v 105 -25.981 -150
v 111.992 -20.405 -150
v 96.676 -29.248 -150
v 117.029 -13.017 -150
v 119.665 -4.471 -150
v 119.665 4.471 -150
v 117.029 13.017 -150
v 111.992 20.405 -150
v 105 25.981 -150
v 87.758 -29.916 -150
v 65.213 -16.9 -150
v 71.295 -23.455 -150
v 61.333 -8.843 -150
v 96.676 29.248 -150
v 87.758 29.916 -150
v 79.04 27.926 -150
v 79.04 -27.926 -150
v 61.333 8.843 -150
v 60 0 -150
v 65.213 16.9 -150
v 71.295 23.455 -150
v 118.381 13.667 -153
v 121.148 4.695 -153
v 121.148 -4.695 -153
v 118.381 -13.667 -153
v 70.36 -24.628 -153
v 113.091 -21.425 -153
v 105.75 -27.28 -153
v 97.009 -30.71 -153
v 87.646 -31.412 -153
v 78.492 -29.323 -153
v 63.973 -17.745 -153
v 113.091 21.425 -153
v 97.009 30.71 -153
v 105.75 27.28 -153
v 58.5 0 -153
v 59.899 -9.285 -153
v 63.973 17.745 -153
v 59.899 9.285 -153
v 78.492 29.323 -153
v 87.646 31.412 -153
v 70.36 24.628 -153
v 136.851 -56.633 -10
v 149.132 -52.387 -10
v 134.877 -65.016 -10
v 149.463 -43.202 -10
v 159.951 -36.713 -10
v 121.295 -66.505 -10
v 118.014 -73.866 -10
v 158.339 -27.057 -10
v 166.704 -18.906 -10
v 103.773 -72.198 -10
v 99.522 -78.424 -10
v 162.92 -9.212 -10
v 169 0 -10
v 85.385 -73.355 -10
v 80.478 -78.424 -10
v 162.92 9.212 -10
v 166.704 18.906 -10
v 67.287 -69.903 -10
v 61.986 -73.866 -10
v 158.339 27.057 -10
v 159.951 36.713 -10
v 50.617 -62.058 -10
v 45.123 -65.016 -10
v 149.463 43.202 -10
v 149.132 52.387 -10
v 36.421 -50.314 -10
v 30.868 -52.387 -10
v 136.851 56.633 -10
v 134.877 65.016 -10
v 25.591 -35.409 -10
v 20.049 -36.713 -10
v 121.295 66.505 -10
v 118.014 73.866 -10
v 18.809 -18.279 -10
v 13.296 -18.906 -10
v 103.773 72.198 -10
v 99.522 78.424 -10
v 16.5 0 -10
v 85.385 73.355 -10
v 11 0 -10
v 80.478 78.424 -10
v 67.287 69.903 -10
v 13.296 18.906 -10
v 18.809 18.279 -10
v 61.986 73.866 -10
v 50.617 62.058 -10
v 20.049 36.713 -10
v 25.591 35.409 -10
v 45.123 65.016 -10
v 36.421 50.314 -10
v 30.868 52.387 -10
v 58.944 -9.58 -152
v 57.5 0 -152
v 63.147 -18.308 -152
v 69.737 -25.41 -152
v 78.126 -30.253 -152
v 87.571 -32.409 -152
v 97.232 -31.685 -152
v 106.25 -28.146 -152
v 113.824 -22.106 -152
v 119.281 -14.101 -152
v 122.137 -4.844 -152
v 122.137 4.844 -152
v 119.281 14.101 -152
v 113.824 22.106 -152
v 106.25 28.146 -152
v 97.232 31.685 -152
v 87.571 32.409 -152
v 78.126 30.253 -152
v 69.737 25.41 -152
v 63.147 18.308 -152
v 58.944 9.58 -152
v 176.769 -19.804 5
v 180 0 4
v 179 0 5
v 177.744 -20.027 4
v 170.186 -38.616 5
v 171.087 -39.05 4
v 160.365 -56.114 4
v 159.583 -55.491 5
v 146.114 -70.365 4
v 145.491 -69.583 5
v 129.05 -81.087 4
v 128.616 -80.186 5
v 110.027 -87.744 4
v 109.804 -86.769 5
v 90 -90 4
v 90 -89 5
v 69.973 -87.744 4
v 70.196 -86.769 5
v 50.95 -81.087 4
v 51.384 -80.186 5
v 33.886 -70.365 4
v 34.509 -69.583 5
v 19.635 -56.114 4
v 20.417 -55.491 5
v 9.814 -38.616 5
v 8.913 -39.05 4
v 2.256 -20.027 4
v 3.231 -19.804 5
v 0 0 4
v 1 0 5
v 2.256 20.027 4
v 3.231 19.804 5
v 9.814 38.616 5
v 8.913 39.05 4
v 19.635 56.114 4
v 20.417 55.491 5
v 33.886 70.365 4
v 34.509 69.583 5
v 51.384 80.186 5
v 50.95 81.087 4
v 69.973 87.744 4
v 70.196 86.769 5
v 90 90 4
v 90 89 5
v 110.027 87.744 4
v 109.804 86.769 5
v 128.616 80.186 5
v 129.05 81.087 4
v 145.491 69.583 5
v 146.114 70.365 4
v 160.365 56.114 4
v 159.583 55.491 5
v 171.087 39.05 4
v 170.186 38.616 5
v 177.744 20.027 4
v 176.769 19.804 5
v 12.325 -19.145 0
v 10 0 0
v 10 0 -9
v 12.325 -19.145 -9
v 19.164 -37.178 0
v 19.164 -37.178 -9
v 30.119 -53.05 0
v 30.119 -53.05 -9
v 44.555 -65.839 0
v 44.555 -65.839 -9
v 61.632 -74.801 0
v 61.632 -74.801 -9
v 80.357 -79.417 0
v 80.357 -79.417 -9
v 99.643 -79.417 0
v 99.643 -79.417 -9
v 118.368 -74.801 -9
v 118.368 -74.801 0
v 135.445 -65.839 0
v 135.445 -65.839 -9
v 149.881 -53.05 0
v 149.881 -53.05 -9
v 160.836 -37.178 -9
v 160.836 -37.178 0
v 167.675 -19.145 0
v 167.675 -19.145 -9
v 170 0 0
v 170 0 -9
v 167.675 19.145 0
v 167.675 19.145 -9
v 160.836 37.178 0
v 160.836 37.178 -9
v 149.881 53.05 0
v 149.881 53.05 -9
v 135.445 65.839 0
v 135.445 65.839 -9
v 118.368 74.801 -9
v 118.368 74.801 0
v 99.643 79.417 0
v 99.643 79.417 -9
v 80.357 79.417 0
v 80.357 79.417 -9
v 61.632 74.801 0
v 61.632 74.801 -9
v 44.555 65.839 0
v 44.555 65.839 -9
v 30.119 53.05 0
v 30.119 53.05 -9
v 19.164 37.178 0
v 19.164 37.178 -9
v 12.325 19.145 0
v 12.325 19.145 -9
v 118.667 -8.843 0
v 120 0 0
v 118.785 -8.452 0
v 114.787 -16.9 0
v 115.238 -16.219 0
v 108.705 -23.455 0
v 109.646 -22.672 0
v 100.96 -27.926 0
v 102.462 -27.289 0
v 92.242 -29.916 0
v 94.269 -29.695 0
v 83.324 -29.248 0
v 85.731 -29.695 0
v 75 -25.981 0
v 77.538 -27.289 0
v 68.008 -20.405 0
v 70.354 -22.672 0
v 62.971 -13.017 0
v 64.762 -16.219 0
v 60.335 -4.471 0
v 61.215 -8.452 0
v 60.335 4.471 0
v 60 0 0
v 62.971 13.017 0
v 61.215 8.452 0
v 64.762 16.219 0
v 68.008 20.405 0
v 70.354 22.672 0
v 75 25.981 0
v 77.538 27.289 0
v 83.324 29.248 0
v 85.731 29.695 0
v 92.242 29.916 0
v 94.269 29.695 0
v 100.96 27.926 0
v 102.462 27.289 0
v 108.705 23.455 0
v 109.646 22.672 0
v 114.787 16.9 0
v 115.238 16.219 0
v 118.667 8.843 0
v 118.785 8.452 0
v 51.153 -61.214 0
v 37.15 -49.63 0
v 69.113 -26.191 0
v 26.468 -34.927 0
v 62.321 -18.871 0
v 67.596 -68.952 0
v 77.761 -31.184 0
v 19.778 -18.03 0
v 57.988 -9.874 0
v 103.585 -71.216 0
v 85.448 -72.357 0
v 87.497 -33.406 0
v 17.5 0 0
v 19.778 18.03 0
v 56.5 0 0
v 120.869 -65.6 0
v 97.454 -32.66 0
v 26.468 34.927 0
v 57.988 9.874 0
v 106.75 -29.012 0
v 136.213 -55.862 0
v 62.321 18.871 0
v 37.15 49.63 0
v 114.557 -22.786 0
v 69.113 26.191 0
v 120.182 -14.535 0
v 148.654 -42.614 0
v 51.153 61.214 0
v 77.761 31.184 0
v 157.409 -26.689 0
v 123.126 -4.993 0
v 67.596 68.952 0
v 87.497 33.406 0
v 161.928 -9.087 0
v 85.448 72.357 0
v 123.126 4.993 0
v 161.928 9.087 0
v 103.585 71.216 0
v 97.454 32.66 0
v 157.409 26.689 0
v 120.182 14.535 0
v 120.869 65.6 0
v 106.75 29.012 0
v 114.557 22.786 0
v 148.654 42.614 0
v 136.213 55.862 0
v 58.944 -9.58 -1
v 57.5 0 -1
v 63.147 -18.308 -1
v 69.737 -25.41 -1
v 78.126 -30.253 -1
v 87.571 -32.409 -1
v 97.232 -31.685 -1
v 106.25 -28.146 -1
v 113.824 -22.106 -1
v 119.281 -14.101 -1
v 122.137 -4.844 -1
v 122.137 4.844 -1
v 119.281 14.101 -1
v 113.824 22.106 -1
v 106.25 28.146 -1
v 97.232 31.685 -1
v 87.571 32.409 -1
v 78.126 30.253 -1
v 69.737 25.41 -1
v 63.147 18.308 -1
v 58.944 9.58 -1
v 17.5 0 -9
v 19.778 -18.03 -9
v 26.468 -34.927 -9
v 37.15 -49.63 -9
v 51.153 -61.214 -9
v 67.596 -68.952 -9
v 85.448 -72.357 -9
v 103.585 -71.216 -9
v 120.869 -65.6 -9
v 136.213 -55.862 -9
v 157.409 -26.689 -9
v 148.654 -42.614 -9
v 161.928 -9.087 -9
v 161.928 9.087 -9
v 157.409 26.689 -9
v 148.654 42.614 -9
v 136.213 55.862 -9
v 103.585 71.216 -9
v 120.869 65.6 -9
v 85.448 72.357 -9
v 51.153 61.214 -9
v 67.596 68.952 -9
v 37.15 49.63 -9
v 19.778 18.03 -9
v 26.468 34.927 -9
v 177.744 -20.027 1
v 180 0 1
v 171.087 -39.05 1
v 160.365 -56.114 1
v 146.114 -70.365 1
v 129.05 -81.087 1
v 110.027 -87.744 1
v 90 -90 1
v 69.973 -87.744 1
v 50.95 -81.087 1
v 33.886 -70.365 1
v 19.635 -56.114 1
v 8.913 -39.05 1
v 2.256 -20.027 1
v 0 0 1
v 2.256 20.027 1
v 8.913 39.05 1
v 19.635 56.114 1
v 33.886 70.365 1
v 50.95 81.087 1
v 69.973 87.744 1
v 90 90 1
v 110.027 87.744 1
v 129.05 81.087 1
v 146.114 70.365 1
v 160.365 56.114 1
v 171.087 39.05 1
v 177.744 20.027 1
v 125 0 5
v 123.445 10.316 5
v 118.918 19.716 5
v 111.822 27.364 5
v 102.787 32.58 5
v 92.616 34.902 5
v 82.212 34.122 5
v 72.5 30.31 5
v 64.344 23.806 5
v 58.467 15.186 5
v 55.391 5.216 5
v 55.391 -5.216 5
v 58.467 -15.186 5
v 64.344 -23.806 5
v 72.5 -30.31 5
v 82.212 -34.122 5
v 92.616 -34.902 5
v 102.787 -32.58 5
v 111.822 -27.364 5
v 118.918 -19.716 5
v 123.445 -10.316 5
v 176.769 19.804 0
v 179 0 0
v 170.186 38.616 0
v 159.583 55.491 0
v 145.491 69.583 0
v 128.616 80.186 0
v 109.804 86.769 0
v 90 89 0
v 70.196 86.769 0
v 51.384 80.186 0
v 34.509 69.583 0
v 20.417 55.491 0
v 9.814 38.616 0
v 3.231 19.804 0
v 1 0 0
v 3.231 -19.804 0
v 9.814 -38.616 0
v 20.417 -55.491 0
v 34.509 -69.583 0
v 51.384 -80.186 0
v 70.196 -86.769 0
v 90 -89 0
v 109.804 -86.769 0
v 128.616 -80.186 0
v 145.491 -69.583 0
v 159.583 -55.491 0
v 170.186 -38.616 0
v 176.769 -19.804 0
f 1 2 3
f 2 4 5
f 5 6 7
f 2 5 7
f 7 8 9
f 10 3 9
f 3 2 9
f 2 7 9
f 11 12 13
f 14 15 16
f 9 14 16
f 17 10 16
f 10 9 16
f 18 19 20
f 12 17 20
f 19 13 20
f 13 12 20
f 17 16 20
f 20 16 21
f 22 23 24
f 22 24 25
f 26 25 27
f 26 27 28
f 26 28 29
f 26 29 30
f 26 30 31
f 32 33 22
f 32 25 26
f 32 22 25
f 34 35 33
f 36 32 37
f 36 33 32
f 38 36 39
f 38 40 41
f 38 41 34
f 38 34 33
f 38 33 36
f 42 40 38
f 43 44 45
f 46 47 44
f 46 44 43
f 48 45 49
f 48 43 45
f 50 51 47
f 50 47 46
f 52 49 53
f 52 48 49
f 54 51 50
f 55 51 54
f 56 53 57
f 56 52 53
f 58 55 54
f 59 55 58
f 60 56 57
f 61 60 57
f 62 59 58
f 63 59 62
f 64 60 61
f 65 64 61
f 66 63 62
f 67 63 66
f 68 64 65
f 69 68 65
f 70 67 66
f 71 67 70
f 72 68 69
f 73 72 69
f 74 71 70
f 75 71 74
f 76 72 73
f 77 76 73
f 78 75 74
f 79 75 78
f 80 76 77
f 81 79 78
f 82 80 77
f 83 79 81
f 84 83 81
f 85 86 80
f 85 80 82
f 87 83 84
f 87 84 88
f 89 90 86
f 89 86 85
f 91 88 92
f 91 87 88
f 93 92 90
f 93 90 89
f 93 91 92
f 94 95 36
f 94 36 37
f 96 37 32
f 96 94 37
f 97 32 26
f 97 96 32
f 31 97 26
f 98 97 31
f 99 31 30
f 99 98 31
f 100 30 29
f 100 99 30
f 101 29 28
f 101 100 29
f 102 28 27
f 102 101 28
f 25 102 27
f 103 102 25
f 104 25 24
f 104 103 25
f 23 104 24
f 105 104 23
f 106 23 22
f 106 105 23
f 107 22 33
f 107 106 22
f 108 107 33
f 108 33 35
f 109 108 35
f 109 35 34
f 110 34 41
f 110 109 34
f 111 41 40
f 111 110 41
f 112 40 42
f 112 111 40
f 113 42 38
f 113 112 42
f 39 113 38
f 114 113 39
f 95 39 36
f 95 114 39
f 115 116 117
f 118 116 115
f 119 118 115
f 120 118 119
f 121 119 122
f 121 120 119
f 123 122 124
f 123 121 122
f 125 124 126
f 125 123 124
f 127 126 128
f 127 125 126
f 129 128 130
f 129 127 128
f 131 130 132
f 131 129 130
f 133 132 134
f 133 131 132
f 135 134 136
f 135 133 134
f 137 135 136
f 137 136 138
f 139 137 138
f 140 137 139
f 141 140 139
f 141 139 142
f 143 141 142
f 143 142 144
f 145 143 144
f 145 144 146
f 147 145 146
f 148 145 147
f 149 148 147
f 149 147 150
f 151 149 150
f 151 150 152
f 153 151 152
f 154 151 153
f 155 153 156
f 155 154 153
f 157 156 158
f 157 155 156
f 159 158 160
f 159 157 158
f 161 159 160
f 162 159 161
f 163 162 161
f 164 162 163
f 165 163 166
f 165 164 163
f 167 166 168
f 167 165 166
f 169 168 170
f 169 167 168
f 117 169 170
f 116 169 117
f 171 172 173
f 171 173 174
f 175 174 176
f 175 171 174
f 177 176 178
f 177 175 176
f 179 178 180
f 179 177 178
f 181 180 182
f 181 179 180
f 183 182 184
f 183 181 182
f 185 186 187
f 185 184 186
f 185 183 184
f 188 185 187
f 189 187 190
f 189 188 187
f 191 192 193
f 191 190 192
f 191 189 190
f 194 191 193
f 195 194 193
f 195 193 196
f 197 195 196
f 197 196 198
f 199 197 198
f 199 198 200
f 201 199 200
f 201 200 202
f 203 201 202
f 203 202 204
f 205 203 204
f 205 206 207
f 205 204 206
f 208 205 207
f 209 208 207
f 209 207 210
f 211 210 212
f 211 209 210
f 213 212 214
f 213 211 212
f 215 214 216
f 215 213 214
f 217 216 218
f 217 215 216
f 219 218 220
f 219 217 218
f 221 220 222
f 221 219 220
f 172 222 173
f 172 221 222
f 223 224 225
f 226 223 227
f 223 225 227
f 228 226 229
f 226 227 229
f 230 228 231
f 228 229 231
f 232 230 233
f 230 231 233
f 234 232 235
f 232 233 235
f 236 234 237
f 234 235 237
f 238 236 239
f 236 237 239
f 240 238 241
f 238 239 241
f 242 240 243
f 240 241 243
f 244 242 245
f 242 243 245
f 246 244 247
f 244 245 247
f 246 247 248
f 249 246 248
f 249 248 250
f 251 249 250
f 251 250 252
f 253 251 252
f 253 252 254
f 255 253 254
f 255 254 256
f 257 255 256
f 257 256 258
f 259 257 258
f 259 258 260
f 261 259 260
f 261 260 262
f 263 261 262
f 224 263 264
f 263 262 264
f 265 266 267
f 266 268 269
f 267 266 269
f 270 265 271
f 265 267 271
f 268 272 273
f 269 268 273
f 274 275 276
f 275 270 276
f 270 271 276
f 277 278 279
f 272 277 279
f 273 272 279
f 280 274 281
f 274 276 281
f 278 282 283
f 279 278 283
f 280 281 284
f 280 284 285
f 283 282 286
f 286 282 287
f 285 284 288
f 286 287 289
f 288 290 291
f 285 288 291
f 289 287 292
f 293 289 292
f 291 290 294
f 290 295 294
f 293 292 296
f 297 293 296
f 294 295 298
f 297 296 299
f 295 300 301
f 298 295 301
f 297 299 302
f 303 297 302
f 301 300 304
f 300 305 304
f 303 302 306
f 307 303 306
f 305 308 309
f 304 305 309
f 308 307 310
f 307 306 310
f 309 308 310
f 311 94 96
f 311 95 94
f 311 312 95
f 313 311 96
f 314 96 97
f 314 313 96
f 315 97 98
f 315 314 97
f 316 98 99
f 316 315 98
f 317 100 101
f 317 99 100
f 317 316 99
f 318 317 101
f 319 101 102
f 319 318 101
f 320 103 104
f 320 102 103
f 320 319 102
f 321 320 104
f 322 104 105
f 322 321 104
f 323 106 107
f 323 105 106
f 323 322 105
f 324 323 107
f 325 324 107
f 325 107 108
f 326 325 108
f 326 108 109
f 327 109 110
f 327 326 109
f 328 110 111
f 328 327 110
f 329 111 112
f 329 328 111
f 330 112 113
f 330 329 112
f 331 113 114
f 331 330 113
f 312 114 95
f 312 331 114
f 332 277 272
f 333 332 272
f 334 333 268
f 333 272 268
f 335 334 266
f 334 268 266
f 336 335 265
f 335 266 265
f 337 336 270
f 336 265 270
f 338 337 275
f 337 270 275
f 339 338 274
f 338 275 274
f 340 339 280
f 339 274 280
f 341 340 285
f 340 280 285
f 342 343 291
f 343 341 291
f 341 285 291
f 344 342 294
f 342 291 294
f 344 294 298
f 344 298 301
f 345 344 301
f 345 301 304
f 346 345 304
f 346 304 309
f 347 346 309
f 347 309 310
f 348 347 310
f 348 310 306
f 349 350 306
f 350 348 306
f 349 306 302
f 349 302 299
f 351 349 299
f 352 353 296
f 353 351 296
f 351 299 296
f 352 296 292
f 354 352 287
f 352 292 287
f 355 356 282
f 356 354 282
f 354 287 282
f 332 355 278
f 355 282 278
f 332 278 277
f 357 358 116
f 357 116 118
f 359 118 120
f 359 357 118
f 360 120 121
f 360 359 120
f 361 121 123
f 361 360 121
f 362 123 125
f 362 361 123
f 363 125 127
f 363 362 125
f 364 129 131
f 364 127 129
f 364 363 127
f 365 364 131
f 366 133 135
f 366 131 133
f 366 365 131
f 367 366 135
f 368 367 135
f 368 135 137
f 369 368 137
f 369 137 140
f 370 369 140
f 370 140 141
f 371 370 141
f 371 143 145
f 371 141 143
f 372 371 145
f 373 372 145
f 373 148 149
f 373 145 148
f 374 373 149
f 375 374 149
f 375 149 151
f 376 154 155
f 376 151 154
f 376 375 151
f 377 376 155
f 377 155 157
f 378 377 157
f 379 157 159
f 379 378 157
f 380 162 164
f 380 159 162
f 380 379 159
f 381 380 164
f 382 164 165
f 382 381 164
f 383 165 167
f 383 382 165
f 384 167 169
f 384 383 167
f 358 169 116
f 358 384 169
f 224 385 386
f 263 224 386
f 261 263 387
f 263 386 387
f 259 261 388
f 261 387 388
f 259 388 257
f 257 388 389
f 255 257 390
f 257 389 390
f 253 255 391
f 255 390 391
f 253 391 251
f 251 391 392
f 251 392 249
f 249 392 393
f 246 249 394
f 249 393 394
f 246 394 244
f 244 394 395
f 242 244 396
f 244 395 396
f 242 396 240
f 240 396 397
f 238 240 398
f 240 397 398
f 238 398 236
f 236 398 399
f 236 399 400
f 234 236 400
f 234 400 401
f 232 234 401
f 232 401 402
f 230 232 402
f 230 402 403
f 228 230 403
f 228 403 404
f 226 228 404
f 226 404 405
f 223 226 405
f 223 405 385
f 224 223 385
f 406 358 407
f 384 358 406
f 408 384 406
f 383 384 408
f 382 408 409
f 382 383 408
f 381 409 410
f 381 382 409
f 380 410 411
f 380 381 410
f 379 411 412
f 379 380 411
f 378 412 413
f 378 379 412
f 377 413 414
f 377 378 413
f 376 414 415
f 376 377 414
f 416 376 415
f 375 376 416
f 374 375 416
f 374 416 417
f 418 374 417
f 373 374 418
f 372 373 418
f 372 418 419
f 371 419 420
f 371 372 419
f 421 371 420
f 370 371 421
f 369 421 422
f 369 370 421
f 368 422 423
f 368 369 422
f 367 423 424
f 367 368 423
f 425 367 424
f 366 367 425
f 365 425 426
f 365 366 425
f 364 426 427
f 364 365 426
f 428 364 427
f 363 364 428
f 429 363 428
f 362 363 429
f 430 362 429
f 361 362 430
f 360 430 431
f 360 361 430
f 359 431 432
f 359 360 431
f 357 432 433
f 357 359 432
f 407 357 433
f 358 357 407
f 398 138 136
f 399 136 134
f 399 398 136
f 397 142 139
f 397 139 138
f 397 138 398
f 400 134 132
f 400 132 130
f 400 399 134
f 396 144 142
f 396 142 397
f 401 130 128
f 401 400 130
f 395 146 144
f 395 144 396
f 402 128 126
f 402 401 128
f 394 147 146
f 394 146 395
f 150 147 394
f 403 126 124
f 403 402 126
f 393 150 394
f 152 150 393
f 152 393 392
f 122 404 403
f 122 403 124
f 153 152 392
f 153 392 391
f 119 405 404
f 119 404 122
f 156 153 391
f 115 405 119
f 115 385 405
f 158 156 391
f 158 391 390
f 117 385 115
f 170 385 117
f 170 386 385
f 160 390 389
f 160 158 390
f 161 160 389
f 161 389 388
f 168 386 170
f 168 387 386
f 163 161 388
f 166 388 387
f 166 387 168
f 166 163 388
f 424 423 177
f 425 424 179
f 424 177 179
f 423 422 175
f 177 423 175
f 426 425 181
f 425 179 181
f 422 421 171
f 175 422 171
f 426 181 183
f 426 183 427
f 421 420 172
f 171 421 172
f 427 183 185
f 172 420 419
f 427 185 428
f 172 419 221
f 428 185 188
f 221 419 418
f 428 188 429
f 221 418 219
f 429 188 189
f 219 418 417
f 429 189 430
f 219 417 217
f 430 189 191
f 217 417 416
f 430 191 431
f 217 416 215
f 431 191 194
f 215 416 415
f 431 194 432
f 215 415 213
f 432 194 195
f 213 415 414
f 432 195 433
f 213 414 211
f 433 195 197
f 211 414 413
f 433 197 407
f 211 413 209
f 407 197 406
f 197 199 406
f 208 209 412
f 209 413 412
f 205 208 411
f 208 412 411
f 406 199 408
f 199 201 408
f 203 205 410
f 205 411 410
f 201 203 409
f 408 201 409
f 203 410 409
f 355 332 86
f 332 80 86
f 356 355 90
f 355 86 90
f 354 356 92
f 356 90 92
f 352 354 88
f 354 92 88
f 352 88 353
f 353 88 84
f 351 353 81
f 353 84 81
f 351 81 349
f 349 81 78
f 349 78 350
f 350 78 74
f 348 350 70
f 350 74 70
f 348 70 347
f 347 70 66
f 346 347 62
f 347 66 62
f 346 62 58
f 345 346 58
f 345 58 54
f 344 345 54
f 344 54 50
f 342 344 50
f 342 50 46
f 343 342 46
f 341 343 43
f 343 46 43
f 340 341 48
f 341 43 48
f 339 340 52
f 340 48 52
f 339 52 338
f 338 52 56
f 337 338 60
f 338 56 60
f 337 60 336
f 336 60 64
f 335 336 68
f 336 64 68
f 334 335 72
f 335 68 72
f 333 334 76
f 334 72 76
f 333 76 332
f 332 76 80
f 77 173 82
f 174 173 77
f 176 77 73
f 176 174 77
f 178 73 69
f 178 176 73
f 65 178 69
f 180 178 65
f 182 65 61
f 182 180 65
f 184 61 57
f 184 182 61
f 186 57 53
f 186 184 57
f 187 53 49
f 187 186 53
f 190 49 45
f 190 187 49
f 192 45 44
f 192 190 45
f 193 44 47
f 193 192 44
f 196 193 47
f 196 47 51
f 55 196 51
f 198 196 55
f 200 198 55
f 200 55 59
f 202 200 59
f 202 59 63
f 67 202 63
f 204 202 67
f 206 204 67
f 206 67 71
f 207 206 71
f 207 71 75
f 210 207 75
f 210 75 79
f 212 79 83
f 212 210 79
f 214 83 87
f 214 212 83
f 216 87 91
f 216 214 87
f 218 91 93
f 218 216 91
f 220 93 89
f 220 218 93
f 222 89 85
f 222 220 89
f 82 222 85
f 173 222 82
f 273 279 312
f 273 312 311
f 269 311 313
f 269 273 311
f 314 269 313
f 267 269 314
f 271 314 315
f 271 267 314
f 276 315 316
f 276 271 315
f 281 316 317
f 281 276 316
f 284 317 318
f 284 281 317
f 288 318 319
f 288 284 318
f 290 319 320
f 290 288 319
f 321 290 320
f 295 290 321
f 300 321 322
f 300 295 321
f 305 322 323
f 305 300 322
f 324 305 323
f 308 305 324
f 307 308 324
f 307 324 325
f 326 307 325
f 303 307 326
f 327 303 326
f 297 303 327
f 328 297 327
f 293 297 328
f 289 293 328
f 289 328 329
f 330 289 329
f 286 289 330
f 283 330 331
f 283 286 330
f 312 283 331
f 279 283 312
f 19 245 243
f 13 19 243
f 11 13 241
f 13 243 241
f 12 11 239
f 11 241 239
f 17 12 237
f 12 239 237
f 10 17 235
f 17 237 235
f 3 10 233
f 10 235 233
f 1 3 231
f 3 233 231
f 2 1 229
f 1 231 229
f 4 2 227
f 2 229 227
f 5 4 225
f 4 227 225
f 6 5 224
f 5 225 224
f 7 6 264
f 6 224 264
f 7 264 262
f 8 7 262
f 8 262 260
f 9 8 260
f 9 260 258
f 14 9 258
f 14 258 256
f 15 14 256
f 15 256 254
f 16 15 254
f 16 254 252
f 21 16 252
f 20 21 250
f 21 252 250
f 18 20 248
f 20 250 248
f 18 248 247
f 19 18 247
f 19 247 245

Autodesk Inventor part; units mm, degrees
ref_plane "YZ Plane" through (0, 0, 0) normal (1, 0, 0) x (0, 1, 0)
ref_plane "XZ Plane" through (0, 0, 0) normal (0, 1, 0) x (-1, 0, 0)
ref_plane "XY Plane" through (0, 0, 0) normal (0, 0, 1) x (1, 0, 0)
ref_plane "Płaszczyzna konstrukcyjna1" through (0, 0, 0) normal (0, 0, 1) x (1, 0, 0)
sketch "Szkic1" plane through (0, 0, 0) normal (0, 0, 1) x (1, 0, 0)
  circle A0 centre (90, 0) radius 90 projected
  circle A1 centre (90, 0) radius 80 projected
  circle A2 centre (90, 0) radius 80
  circle A3 centre (90, 0) radius 72.5
  circle A4 centre (90, 0) radius 30
  point P0 (0, 0)
  dimension "d0" = 145
  dimension "d1" = 60
extrude "Wyciągnięcie proste1" add sketch "Szkic1" along normal blind 5 contours A0 | A1 | A3
sketch "Szkic2" plane through (90, 0, 0) normal (0, 0, -1) x (-1, 0, 0)
  circle A0 centre (0, 0) radius 30
  circle A1 centre (0, 0) radius 32.5
  point P0 (90, 0)
  dimension "d4" = 65
extrude "Wyciągnięcie proste2" add sketch "Szkic2" along normal blind 150
sketch "Szkic3" plane through (90, 0, -150) normal (0, 0, -1) x (-1, 0, 0)
  circle A0 centre (0, 0) radius 32.5
  point P0 (90, 0)
extrude "Wyciągnięcie proste3" add sketch "Szkic3" along normal blind 3
chamfer "Faza1" distance 1 angle 45 1 edges at (122.5, 0, -153)
chamfer "Faza2" distance 5 angle 45 1 edges at (60, 0, 5)
sketch "Szkic4" plane through (90, 0, 0) normal (0, 0, -1) x (-1, 0, 0)
  circle A0 centre (0, 0) radius 80 projected
  circle A1 centre (0, 0) radius 80
  circle A2 centre (0, 0) radius 72.5
  point P0 (90, 0)
  dimension "d15" = 145
extrude "Wyciągnięcie proste4" add sketch "Szkic4" along normal blind 10
chamfer "Faza3" distance 1 angle 45 5 edges at (0, 0, 5) (0, 0, 0) (170, 0, -10) (162.5, 0, -10) (122.5, 0, 0)
properties part number "dekiel" material "Stal nierdzewna"
